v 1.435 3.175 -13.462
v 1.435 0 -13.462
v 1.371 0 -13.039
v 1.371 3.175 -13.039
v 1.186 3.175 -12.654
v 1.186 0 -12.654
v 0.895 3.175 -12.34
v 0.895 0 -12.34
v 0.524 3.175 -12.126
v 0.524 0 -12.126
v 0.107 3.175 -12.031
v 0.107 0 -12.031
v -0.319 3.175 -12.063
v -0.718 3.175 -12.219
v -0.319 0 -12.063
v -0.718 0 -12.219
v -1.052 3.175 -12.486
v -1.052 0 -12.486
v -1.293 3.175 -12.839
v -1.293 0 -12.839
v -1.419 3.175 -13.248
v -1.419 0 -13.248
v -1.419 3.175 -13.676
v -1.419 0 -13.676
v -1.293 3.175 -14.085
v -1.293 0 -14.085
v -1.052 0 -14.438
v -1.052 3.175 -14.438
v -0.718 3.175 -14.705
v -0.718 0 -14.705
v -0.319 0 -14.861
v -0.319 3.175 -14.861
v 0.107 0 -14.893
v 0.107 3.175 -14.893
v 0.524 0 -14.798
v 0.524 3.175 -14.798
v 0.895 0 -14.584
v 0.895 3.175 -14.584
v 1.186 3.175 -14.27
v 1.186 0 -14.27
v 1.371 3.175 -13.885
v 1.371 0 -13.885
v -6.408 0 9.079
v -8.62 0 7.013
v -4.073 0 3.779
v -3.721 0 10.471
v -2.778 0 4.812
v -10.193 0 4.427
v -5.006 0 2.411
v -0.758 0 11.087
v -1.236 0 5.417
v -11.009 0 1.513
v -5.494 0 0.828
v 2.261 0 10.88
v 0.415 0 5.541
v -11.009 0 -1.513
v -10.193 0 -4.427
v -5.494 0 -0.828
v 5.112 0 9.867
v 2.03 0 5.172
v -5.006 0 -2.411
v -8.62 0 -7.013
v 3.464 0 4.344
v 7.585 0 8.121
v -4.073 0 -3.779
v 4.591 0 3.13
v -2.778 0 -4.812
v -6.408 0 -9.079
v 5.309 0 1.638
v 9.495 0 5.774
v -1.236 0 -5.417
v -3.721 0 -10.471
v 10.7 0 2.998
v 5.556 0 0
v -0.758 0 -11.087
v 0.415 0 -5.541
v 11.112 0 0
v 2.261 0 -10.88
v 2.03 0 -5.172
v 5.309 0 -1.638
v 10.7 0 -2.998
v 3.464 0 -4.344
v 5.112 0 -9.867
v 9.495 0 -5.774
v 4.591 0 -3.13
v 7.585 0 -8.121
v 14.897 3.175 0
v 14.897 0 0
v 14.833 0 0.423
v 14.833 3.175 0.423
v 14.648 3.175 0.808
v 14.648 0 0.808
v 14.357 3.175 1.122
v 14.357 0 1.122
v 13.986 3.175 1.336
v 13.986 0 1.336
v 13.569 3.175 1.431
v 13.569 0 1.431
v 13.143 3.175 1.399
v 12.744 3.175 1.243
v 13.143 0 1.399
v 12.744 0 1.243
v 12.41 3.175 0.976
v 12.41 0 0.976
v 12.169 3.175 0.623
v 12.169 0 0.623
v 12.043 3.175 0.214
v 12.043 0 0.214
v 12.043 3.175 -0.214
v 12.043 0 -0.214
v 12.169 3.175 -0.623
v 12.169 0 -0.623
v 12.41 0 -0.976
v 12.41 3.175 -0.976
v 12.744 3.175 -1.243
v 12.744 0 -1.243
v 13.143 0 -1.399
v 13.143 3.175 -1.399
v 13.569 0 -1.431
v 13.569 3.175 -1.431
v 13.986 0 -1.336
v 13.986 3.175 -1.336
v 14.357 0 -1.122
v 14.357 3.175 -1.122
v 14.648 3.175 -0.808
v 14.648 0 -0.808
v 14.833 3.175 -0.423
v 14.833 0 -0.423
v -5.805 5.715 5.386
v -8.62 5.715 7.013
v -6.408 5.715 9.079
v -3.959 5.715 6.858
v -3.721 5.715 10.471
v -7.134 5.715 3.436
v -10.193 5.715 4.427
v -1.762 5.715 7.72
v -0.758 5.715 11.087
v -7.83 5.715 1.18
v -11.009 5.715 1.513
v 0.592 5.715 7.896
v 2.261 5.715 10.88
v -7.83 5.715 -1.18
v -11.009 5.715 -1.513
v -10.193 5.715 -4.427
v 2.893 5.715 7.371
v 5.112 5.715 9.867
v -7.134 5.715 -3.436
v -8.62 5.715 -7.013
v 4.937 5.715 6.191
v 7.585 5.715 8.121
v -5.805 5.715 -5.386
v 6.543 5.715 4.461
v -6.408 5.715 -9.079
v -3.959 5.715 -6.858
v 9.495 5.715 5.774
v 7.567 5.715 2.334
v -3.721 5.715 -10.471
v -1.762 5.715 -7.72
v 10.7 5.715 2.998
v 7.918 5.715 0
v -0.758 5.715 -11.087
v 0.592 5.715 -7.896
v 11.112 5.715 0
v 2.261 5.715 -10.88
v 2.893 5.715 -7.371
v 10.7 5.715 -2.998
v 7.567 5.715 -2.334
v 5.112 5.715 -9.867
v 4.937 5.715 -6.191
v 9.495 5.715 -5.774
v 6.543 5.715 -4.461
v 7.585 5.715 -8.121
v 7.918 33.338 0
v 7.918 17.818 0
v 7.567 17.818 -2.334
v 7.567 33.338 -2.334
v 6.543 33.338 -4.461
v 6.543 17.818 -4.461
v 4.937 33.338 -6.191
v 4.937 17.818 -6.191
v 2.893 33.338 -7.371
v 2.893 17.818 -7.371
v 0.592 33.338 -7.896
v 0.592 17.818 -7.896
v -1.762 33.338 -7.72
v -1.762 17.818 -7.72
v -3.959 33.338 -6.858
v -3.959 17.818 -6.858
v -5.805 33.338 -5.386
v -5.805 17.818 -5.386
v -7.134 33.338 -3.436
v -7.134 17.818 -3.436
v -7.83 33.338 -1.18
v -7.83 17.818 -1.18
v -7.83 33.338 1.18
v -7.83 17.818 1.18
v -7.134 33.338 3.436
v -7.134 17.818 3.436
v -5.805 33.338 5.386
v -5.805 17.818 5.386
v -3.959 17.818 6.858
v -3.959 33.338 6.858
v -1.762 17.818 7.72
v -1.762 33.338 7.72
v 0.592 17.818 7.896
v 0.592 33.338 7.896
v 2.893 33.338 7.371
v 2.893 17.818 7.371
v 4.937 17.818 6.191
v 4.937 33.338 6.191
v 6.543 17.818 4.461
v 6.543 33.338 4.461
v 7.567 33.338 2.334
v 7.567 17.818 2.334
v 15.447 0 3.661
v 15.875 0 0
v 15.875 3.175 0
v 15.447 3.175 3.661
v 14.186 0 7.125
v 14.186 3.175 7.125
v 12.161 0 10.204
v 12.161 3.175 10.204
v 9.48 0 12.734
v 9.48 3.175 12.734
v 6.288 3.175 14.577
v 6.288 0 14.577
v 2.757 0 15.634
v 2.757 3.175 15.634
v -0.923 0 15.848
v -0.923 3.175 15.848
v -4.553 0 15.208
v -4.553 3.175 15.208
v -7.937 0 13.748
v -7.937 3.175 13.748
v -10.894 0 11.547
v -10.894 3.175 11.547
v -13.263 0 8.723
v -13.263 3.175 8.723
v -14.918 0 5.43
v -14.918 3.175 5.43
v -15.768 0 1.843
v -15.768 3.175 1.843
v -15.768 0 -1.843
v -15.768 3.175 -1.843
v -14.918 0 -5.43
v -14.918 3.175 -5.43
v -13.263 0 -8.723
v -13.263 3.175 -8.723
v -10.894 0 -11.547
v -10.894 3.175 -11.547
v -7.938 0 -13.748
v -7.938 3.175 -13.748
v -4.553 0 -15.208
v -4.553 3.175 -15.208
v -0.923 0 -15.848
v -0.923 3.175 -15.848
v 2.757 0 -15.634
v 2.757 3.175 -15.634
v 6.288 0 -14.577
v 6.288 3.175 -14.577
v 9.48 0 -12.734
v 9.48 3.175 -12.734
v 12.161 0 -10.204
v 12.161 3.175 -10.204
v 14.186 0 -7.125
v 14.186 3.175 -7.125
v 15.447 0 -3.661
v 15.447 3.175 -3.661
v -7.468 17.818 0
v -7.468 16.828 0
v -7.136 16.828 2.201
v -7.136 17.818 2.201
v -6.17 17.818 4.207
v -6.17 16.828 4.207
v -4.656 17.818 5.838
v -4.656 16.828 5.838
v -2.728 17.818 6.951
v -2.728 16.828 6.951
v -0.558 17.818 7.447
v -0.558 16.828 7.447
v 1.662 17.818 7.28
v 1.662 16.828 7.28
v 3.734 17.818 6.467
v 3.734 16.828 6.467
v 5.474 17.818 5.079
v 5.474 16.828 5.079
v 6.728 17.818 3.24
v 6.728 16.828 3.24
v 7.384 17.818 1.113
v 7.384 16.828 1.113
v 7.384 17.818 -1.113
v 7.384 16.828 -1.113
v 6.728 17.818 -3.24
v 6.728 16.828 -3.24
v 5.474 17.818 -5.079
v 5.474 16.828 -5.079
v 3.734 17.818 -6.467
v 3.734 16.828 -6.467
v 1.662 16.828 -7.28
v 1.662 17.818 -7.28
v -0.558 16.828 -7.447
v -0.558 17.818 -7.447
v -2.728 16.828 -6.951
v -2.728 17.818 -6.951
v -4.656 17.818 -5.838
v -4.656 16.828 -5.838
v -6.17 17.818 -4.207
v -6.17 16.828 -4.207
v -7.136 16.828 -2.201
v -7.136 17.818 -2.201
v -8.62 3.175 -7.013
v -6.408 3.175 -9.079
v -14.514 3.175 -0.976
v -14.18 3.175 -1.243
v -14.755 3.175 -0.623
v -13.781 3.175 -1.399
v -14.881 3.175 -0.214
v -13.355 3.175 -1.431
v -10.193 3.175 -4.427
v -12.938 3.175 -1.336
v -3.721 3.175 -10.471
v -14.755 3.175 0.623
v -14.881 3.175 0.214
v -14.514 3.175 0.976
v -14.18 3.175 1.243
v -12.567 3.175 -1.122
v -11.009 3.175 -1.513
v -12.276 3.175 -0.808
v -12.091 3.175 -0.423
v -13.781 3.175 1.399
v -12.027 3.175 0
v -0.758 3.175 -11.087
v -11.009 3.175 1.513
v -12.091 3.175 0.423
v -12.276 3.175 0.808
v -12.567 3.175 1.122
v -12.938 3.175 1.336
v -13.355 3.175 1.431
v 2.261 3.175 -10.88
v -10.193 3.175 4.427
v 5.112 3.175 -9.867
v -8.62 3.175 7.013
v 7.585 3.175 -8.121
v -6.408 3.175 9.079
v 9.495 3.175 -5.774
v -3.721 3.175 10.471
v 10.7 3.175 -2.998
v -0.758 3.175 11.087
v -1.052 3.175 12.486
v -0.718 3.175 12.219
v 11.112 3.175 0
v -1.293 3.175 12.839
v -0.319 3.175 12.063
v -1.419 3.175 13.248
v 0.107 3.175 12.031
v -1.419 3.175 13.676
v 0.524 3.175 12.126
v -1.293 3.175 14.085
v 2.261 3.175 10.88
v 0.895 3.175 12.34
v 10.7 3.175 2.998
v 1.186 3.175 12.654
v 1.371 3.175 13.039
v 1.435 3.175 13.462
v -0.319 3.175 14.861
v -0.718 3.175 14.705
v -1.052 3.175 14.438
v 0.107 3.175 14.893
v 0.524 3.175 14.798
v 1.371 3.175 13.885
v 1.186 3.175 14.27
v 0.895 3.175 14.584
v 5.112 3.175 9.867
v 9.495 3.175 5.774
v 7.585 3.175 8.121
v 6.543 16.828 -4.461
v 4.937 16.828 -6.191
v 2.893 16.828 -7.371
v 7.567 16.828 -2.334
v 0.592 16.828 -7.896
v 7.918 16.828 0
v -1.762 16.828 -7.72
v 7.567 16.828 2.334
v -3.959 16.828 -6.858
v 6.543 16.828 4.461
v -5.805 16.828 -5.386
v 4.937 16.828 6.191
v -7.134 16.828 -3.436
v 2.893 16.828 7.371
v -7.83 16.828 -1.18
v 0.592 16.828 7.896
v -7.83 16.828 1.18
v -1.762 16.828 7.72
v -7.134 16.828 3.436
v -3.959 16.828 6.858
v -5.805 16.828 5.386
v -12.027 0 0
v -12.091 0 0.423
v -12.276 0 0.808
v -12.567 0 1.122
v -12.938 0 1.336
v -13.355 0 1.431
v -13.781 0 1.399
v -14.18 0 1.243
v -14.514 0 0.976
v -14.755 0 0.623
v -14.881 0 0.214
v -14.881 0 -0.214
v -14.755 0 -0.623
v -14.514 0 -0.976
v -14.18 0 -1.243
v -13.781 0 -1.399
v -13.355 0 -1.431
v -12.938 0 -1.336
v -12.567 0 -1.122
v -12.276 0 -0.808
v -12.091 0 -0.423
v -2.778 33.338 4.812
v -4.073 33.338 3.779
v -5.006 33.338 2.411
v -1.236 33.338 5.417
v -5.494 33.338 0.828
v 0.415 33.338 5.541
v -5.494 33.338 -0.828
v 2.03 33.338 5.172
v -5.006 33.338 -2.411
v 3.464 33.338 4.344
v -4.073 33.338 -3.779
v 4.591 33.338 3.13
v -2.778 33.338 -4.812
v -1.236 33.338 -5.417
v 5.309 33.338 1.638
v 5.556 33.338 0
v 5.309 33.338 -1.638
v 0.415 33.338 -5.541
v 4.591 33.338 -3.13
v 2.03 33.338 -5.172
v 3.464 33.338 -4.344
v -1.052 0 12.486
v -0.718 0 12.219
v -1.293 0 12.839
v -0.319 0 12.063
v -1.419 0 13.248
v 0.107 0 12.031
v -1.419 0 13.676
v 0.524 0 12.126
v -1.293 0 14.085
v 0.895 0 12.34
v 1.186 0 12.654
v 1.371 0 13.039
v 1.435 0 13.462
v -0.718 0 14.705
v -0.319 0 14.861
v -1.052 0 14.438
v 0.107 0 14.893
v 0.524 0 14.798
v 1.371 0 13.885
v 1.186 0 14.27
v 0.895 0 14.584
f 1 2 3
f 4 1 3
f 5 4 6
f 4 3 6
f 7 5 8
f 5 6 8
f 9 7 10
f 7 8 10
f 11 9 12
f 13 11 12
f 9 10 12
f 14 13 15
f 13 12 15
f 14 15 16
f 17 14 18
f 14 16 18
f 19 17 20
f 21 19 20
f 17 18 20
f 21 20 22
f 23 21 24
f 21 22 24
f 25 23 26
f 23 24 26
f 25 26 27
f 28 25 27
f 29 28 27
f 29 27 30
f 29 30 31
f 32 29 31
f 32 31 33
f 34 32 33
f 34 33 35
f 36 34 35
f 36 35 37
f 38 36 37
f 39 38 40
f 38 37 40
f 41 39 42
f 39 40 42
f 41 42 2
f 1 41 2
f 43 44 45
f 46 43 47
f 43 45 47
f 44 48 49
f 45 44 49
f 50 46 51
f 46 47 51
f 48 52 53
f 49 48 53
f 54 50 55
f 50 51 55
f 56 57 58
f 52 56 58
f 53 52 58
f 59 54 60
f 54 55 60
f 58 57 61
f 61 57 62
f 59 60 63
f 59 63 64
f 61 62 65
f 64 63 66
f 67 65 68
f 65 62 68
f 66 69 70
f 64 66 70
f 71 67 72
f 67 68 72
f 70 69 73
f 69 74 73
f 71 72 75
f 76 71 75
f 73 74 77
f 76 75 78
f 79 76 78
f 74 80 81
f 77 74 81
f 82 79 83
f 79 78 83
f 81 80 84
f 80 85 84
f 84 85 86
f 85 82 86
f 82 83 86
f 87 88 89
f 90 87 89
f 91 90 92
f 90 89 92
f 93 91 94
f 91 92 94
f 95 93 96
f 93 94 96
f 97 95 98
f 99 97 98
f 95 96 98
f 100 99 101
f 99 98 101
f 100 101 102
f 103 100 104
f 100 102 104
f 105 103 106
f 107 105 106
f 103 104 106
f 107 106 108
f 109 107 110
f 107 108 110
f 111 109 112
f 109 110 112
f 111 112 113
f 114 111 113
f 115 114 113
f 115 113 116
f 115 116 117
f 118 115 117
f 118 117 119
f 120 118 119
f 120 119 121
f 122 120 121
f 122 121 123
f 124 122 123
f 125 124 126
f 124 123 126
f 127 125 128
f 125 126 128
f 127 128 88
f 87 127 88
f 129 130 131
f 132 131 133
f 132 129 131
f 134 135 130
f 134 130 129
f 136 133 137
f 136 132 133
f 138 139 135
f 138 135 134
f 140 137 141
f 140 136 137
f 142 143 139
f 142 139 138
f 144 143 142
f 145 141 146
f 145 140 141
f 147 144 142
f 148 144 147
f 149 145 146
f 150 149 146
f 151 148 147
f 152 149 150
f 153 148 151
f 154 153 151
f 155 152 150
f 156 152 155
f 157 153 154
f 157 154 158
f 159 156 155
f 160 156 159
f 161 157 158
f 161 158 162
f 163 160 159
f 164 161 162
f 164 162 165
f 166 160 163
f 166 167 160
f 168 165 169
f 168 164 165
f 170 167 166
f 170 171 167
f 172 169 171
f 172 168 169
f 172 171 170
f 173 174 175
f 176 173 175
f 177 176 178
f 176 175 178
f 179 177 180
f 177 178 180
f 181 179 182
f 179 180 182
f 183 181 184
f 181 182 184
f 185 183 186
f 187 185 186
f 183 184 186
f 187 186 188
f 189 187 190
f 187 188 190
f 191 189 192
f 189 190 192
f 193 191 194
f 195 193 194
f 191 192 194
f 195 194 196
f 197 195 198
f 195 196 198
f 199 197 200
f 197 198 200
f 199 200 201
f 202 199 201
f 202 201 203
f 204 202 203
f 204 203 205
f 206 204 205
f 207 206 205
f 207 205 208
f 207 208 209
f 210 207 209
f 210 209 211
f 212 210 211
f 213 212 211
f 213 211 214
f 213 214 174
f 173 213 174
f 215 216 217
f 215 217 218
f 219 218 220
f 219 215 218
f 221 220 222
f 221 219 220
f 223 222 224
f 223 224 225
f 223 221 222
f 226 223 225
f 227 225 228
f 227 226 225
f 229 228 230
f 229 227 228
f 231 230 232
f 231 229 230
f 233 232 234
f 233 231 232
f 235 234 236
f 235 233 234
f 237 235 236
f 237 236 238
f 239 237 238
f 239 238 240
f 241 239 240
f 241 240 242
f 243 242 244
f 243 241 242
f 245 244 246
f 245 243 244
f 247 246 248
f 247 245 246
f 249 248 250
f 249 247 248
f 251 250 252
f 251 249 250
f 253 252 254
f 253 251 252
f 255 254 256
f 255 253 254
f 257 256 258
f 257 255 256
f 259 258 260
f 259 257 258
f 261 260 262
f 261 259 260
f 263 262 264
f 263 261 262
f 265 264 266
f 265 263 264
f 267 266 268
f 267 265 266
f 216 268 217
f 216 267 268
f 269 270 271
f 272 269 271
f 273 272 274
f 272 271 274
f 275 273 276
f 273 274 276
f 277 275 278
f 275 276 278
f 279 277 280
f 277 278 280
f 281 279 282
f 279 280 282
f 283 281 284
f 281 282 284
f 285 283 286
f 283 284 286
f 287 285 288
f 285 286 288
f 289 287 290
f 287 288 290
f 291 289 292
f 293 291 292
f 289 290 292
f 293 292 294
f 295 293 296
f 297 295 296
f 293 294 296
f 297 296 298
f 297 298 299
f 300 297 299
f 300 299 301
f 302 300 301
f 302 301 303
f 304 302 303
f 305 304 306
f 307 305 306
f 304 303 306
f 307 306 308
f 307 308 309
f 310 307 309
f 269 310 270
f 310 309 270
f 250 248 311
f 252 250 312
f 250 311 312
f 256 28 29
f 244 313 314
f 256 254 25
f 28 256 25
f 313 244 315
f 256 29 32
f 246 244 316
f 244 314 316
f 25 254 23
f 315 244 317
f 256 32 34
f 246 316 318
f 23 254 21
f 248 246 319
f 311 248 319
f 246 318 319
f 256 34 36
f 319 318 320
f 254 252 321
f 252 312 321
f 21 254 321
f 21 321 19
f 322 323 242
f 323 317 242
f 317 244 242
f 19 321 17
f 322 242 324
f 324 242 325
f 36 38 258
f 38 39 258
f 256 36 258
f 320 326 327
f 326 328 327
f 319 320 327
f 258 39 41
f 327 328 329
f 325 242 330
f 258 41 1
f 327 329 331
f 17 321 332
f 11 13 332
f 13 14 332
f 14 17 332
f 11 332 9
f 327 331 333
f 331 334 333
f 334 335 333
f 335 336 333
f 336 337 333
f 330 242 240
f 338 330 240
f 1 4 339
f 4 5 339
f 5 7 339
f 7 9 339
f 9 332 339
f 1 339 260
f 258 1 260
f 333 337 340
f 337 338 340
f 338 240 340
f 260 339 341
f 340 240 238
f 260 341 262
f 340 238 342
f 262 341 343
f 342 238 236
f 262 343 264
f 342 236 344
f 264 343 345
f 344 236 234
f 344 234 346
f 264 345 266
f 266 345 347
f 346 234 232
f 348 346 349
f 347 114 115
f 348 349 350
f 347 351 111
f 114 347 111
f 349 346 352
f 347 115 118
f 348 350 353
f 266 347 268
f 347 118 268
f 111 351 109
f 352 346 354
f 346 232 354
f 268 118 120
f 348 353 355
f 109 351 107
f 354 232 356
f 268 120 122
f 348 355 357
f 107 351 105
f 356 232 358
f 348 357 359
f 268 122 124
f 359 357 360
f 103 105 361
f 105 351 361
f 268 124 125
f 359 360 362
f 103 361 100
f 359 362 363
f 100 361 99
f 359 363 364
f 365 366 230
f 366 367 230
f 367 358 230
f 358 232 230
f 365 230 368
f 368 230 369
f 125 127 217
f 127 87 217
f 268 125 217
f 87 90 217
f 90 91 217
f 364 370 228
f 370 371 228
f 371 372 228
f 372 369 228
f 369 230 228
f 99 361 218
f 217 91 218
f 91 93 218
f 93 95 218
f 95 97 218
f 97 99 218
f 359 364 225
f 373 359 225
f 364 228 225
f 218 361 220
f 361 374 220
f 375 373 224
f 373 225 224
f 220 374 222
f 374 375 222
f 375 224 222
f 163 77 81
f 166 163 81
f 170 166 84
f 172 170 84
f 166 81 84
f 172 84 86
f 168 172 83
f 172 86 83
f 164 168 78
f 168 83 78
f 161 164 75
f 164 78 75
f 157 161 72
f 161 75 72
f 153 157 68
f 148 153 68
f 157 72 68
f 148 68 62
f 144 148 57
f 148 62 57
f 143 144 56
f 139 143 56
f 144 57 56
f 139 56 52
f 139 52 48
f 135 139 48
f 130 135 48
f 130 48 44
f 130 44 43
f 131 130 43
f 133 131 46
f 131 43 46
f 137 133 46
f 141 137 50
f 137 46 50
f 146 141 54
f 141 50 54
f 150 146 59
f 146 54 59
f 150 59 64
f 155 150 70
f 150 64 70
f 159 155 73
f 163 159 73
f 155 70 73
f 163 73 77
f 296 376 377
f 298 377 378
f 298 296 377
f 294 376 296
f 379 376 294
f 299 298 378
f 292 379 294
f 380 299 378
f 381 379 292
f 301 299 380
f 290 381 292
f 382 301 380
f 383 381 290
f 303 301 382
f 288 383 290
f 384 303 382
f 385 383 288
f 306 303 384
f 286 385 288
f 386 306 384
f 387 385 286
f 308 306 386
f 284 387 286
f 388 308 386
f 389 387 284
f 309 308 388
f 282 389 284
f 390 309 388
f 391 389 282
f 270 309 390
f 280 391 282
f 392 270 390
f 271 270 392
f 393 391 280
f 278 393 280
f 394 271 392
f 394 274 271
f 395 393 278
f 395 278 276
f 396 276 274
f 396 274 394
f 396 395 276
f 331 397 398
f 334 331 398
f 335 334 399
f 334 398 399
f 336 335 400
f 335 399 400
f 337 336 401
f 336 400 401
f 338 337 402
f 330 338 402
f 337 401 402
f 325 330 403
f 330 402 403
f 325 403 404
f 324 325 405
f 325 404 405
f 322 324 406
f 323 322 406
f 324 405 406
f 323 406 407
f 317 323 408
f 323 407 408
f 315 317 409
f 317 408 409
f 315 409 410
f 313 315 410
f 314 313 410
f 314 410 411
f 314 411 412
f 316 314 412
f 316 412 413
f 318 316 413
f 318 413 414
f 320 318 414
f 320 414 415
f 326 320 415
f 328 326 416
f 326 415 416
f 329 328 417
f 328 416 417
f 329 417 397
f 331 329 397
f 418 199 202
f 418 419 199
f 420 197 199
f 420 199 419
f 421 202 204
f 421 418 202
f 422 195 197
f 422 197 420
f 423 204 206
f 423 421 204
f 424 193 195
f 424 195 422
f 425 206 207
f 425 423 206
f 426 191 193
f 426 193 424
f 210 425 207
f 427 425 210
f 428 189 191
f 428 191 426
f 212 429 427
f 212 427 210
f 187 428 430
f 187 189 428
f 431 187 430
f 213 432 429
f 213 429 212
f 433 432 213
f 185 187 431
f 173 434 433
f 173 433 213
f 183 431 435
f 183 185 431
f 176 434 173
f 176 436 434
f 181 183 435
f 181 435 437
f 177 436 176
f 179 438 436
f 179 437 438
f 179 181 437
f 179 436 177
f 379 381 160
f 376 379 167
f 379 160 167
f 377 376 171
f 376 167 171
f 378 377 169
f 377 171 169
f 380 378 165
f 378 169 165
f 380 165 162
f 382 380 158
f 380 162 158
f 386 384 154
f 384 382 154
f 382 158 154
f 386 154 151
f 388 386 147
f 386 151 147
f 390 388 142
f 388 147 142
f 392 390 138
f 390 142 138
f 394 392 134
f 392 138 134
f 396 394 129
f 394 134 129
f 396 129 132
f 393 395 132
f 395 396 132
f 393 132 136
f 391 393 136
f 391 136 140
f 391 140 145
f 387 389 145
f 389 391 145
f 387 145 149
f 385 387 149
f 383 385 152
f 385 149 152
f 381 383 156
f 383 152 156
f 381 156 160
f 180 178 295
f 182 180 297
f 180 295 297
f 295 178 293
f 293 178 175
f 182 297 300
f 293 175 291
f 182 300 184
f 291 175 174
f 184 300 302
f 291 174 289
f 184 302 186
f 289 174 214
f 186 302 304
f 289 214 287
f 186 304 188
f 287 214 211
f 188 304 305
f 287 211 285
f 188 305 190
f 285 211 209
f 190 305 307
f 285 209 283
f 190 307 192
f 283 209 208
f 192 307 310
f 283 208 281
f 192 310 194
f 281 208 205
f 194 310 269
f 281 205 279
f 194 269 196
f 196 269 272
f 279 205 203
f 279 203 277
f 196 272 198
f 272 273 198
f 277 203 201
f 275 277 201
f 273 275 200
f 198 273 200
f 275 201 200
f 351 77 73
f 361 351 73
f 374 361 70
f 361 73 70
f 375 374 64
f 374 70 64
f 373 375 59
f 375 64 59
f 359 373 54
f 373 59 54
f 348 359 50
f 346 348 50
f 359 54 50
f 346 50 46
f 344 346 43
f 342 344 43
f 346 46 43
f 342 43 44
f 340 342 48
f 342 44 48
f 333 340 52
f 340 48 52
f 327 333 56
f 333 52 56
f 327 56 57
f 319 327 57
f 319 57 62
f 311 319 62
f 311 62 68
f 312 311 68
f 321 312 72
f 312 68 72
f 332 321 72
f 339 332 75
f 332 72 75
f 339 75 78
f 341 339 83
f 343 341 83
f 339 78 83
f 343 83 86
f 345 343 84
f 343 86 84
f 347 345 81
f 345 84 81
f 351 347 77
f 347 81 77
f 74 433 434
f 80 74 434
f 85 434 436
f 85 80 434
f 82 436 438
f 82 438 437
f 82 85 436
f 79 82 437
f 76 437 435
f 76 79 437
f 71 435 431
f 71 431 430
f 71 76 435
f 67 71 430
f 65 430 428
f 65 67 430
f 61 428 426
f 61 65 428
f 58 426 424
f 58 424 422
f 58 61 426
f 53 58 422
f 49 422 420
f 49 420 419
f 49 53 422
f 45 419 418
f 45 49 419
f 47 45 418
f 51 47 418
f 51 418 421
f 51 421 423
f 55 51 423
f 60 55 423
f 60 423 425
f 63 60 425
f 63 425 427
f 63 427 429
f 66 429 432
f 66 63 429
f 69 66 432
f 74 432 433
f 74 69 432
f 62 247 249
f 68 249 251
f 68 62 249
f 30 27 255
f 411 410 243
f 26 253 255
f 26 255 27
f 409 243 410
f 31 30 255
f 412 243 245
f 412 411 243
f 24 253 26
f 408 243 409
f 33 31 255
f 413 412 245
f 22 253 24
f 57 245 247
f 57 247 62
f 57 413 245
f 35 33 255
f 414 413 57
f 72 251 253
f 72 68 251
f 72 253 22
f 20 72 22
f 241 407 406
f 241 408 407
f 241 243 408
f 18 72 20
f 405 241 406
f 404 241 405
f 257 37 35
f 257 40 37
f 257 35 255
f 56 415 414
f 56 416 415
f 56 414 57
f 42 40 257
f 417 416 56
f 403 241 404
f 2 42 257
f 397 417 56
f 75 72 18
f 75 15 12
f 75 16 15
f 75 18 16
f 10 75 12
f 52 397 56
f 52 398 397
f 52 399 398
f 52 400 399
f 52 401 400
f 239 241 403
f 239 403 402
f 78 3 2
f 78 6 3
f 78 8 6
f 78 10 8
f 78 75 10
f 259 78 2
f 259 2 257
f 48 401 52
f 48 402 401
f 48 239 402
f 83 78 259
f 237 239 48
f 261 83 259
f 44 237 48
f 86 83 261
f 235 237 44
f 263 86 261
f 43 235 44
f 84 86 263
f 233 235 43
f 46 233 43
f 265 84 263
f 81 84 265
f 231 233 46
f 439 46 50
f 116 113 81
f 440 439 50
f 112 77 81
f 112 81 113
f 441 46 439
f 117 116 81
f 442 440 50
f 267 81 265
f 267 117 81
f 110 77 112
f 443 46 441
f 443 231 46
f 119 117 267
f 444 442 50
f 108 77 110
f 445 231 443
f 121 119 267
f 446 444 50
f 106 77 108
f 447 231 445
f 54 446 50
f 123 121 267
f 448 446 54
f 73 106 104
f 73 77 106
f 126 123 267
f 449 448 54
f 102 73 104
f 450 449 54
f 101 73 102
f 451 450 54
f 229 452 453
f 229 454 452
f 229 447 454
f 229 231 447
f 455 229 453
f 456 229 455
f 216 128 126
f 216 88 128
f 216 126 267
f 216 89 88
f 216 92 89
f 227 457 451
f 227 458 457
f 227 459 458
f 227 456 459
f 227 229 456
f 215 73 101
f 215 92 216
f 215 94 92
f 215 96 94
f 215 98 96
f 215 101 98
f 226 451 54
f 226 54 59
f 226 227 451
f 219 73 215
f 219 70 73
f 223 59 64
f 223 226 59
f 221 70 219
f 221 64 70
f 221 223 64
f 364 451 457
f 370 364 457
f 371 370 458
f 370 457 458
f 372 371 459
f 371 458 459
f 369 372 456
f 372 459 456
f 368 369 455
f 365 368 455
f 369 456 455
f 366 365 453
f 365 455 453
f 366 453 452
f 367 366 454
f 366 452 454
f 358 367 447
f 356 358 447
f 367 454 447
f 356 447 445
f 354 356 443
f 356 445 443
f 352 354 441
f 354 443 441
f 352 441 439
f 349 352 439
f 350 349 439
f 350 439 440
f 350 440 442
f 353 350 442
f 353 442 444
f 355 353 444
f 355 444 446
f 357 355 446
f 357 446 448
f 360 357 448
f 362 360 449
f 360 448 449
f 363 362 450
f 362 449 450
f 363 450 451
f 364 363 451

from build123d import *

# Parameters (mm, degrees)
SKETCH1_R           = 11.1125
SKETCH1_R_2         = 5.55625
BOSS_EXTRUDE1_DEPTH = 5.715
SKETCH2_R           = 7.91845
SKETCH2_R_2         = 5.55625
BOSS_EXTRUDE2_DEPTH = 27.6225
SKETCH3_OUTSIDE_W   = 33.388
SKETCH3_OUTSIDE_H   = 33.388
SKETCH3_OUTSIDE_R   = 7.4676
CUT_EXTRUDE1_DEPTH  = 0.9906
SKETCH4_R           = 15.875
SKETCH4_R_2         = 1.4351
SKETCH4_R_3         = 11.1125
BOSS_EXTRUDE3_DEPTH = 3.175


with BuildPart() as part:
    # Sketch1 → Boss-Extrude1 (new body)
    with BuildSketch(Plane(origin=(0, 0, 0), x_dir=(1, 0, 0), z_dir=(0, 1, 0))):
        Circle(SKETCH1_R)
        Circle(SKETCH1_R_2, mode=Mode.SUBTRACT)
    extrude(amount=BOSS_EXTRUDE1_DEPTH)

    # Sketch2 → Boss-Extrude2 (add)
    with BuildSketch(Plane(origin=(0, 5.715, 0), x_dir=(1, 0, 0), z_dir=(0, 1, 0))):
        Circle(SKETCH2_R)
        Circle(SKETCH2_R_2, mode=Mode.SUBTRACT)
    extrude(amount=BOSS_EXTRUDE2_DEPTH)

    # Sketch3 outside → Cut-Extrude1 (cut)
    with BuildSketch(Plane(origin=(0, 16.8275, 0), x_dir=(-1, 0, 0), z_dir=(0, 1, 0))):
        Rectangle(SKETCH3_OUTSIDE_W, SKETCH3_OUTSIDE_H)
        Circle(SKETCH3_OUTSIDE_R, mode=Mode.SUBTRACT)
    extrude(amount=CUT_EXTRUDE1_DEPTH, mode=Mode.SUBTRACT)


with BuildPart() as body_2:
    # Sketch4 → Boss-Extrude3 (new body)
    with BuildSketch(Plane.XZ):
        Circle(SKETCH4_R)
        with Locations((0, 13.462)):
            Circle(SKETCH4_R_2, mode=Mode.SUBTRACT)
        with Locations((13.462, 0)):
            Circle(SKETCH4_R_2, mode=Mode.SUBTRACT)
        with Locations((0, -13.462)):
            Circle(SKETCH4_R_2, mode=Mode.SUBTRACT)
        with Locations((-13.462, 0)):
            Circle(SKETCH4_R_2, mode=Mode.SUBTRACT)
        Circle(SKETCH4_R_3, mode=Mode.SUBTRACT)
    extrude(amount=-BOSS_EXTRUDE3_DEPTH)


solid = Compound([part.part, body_2.part])
